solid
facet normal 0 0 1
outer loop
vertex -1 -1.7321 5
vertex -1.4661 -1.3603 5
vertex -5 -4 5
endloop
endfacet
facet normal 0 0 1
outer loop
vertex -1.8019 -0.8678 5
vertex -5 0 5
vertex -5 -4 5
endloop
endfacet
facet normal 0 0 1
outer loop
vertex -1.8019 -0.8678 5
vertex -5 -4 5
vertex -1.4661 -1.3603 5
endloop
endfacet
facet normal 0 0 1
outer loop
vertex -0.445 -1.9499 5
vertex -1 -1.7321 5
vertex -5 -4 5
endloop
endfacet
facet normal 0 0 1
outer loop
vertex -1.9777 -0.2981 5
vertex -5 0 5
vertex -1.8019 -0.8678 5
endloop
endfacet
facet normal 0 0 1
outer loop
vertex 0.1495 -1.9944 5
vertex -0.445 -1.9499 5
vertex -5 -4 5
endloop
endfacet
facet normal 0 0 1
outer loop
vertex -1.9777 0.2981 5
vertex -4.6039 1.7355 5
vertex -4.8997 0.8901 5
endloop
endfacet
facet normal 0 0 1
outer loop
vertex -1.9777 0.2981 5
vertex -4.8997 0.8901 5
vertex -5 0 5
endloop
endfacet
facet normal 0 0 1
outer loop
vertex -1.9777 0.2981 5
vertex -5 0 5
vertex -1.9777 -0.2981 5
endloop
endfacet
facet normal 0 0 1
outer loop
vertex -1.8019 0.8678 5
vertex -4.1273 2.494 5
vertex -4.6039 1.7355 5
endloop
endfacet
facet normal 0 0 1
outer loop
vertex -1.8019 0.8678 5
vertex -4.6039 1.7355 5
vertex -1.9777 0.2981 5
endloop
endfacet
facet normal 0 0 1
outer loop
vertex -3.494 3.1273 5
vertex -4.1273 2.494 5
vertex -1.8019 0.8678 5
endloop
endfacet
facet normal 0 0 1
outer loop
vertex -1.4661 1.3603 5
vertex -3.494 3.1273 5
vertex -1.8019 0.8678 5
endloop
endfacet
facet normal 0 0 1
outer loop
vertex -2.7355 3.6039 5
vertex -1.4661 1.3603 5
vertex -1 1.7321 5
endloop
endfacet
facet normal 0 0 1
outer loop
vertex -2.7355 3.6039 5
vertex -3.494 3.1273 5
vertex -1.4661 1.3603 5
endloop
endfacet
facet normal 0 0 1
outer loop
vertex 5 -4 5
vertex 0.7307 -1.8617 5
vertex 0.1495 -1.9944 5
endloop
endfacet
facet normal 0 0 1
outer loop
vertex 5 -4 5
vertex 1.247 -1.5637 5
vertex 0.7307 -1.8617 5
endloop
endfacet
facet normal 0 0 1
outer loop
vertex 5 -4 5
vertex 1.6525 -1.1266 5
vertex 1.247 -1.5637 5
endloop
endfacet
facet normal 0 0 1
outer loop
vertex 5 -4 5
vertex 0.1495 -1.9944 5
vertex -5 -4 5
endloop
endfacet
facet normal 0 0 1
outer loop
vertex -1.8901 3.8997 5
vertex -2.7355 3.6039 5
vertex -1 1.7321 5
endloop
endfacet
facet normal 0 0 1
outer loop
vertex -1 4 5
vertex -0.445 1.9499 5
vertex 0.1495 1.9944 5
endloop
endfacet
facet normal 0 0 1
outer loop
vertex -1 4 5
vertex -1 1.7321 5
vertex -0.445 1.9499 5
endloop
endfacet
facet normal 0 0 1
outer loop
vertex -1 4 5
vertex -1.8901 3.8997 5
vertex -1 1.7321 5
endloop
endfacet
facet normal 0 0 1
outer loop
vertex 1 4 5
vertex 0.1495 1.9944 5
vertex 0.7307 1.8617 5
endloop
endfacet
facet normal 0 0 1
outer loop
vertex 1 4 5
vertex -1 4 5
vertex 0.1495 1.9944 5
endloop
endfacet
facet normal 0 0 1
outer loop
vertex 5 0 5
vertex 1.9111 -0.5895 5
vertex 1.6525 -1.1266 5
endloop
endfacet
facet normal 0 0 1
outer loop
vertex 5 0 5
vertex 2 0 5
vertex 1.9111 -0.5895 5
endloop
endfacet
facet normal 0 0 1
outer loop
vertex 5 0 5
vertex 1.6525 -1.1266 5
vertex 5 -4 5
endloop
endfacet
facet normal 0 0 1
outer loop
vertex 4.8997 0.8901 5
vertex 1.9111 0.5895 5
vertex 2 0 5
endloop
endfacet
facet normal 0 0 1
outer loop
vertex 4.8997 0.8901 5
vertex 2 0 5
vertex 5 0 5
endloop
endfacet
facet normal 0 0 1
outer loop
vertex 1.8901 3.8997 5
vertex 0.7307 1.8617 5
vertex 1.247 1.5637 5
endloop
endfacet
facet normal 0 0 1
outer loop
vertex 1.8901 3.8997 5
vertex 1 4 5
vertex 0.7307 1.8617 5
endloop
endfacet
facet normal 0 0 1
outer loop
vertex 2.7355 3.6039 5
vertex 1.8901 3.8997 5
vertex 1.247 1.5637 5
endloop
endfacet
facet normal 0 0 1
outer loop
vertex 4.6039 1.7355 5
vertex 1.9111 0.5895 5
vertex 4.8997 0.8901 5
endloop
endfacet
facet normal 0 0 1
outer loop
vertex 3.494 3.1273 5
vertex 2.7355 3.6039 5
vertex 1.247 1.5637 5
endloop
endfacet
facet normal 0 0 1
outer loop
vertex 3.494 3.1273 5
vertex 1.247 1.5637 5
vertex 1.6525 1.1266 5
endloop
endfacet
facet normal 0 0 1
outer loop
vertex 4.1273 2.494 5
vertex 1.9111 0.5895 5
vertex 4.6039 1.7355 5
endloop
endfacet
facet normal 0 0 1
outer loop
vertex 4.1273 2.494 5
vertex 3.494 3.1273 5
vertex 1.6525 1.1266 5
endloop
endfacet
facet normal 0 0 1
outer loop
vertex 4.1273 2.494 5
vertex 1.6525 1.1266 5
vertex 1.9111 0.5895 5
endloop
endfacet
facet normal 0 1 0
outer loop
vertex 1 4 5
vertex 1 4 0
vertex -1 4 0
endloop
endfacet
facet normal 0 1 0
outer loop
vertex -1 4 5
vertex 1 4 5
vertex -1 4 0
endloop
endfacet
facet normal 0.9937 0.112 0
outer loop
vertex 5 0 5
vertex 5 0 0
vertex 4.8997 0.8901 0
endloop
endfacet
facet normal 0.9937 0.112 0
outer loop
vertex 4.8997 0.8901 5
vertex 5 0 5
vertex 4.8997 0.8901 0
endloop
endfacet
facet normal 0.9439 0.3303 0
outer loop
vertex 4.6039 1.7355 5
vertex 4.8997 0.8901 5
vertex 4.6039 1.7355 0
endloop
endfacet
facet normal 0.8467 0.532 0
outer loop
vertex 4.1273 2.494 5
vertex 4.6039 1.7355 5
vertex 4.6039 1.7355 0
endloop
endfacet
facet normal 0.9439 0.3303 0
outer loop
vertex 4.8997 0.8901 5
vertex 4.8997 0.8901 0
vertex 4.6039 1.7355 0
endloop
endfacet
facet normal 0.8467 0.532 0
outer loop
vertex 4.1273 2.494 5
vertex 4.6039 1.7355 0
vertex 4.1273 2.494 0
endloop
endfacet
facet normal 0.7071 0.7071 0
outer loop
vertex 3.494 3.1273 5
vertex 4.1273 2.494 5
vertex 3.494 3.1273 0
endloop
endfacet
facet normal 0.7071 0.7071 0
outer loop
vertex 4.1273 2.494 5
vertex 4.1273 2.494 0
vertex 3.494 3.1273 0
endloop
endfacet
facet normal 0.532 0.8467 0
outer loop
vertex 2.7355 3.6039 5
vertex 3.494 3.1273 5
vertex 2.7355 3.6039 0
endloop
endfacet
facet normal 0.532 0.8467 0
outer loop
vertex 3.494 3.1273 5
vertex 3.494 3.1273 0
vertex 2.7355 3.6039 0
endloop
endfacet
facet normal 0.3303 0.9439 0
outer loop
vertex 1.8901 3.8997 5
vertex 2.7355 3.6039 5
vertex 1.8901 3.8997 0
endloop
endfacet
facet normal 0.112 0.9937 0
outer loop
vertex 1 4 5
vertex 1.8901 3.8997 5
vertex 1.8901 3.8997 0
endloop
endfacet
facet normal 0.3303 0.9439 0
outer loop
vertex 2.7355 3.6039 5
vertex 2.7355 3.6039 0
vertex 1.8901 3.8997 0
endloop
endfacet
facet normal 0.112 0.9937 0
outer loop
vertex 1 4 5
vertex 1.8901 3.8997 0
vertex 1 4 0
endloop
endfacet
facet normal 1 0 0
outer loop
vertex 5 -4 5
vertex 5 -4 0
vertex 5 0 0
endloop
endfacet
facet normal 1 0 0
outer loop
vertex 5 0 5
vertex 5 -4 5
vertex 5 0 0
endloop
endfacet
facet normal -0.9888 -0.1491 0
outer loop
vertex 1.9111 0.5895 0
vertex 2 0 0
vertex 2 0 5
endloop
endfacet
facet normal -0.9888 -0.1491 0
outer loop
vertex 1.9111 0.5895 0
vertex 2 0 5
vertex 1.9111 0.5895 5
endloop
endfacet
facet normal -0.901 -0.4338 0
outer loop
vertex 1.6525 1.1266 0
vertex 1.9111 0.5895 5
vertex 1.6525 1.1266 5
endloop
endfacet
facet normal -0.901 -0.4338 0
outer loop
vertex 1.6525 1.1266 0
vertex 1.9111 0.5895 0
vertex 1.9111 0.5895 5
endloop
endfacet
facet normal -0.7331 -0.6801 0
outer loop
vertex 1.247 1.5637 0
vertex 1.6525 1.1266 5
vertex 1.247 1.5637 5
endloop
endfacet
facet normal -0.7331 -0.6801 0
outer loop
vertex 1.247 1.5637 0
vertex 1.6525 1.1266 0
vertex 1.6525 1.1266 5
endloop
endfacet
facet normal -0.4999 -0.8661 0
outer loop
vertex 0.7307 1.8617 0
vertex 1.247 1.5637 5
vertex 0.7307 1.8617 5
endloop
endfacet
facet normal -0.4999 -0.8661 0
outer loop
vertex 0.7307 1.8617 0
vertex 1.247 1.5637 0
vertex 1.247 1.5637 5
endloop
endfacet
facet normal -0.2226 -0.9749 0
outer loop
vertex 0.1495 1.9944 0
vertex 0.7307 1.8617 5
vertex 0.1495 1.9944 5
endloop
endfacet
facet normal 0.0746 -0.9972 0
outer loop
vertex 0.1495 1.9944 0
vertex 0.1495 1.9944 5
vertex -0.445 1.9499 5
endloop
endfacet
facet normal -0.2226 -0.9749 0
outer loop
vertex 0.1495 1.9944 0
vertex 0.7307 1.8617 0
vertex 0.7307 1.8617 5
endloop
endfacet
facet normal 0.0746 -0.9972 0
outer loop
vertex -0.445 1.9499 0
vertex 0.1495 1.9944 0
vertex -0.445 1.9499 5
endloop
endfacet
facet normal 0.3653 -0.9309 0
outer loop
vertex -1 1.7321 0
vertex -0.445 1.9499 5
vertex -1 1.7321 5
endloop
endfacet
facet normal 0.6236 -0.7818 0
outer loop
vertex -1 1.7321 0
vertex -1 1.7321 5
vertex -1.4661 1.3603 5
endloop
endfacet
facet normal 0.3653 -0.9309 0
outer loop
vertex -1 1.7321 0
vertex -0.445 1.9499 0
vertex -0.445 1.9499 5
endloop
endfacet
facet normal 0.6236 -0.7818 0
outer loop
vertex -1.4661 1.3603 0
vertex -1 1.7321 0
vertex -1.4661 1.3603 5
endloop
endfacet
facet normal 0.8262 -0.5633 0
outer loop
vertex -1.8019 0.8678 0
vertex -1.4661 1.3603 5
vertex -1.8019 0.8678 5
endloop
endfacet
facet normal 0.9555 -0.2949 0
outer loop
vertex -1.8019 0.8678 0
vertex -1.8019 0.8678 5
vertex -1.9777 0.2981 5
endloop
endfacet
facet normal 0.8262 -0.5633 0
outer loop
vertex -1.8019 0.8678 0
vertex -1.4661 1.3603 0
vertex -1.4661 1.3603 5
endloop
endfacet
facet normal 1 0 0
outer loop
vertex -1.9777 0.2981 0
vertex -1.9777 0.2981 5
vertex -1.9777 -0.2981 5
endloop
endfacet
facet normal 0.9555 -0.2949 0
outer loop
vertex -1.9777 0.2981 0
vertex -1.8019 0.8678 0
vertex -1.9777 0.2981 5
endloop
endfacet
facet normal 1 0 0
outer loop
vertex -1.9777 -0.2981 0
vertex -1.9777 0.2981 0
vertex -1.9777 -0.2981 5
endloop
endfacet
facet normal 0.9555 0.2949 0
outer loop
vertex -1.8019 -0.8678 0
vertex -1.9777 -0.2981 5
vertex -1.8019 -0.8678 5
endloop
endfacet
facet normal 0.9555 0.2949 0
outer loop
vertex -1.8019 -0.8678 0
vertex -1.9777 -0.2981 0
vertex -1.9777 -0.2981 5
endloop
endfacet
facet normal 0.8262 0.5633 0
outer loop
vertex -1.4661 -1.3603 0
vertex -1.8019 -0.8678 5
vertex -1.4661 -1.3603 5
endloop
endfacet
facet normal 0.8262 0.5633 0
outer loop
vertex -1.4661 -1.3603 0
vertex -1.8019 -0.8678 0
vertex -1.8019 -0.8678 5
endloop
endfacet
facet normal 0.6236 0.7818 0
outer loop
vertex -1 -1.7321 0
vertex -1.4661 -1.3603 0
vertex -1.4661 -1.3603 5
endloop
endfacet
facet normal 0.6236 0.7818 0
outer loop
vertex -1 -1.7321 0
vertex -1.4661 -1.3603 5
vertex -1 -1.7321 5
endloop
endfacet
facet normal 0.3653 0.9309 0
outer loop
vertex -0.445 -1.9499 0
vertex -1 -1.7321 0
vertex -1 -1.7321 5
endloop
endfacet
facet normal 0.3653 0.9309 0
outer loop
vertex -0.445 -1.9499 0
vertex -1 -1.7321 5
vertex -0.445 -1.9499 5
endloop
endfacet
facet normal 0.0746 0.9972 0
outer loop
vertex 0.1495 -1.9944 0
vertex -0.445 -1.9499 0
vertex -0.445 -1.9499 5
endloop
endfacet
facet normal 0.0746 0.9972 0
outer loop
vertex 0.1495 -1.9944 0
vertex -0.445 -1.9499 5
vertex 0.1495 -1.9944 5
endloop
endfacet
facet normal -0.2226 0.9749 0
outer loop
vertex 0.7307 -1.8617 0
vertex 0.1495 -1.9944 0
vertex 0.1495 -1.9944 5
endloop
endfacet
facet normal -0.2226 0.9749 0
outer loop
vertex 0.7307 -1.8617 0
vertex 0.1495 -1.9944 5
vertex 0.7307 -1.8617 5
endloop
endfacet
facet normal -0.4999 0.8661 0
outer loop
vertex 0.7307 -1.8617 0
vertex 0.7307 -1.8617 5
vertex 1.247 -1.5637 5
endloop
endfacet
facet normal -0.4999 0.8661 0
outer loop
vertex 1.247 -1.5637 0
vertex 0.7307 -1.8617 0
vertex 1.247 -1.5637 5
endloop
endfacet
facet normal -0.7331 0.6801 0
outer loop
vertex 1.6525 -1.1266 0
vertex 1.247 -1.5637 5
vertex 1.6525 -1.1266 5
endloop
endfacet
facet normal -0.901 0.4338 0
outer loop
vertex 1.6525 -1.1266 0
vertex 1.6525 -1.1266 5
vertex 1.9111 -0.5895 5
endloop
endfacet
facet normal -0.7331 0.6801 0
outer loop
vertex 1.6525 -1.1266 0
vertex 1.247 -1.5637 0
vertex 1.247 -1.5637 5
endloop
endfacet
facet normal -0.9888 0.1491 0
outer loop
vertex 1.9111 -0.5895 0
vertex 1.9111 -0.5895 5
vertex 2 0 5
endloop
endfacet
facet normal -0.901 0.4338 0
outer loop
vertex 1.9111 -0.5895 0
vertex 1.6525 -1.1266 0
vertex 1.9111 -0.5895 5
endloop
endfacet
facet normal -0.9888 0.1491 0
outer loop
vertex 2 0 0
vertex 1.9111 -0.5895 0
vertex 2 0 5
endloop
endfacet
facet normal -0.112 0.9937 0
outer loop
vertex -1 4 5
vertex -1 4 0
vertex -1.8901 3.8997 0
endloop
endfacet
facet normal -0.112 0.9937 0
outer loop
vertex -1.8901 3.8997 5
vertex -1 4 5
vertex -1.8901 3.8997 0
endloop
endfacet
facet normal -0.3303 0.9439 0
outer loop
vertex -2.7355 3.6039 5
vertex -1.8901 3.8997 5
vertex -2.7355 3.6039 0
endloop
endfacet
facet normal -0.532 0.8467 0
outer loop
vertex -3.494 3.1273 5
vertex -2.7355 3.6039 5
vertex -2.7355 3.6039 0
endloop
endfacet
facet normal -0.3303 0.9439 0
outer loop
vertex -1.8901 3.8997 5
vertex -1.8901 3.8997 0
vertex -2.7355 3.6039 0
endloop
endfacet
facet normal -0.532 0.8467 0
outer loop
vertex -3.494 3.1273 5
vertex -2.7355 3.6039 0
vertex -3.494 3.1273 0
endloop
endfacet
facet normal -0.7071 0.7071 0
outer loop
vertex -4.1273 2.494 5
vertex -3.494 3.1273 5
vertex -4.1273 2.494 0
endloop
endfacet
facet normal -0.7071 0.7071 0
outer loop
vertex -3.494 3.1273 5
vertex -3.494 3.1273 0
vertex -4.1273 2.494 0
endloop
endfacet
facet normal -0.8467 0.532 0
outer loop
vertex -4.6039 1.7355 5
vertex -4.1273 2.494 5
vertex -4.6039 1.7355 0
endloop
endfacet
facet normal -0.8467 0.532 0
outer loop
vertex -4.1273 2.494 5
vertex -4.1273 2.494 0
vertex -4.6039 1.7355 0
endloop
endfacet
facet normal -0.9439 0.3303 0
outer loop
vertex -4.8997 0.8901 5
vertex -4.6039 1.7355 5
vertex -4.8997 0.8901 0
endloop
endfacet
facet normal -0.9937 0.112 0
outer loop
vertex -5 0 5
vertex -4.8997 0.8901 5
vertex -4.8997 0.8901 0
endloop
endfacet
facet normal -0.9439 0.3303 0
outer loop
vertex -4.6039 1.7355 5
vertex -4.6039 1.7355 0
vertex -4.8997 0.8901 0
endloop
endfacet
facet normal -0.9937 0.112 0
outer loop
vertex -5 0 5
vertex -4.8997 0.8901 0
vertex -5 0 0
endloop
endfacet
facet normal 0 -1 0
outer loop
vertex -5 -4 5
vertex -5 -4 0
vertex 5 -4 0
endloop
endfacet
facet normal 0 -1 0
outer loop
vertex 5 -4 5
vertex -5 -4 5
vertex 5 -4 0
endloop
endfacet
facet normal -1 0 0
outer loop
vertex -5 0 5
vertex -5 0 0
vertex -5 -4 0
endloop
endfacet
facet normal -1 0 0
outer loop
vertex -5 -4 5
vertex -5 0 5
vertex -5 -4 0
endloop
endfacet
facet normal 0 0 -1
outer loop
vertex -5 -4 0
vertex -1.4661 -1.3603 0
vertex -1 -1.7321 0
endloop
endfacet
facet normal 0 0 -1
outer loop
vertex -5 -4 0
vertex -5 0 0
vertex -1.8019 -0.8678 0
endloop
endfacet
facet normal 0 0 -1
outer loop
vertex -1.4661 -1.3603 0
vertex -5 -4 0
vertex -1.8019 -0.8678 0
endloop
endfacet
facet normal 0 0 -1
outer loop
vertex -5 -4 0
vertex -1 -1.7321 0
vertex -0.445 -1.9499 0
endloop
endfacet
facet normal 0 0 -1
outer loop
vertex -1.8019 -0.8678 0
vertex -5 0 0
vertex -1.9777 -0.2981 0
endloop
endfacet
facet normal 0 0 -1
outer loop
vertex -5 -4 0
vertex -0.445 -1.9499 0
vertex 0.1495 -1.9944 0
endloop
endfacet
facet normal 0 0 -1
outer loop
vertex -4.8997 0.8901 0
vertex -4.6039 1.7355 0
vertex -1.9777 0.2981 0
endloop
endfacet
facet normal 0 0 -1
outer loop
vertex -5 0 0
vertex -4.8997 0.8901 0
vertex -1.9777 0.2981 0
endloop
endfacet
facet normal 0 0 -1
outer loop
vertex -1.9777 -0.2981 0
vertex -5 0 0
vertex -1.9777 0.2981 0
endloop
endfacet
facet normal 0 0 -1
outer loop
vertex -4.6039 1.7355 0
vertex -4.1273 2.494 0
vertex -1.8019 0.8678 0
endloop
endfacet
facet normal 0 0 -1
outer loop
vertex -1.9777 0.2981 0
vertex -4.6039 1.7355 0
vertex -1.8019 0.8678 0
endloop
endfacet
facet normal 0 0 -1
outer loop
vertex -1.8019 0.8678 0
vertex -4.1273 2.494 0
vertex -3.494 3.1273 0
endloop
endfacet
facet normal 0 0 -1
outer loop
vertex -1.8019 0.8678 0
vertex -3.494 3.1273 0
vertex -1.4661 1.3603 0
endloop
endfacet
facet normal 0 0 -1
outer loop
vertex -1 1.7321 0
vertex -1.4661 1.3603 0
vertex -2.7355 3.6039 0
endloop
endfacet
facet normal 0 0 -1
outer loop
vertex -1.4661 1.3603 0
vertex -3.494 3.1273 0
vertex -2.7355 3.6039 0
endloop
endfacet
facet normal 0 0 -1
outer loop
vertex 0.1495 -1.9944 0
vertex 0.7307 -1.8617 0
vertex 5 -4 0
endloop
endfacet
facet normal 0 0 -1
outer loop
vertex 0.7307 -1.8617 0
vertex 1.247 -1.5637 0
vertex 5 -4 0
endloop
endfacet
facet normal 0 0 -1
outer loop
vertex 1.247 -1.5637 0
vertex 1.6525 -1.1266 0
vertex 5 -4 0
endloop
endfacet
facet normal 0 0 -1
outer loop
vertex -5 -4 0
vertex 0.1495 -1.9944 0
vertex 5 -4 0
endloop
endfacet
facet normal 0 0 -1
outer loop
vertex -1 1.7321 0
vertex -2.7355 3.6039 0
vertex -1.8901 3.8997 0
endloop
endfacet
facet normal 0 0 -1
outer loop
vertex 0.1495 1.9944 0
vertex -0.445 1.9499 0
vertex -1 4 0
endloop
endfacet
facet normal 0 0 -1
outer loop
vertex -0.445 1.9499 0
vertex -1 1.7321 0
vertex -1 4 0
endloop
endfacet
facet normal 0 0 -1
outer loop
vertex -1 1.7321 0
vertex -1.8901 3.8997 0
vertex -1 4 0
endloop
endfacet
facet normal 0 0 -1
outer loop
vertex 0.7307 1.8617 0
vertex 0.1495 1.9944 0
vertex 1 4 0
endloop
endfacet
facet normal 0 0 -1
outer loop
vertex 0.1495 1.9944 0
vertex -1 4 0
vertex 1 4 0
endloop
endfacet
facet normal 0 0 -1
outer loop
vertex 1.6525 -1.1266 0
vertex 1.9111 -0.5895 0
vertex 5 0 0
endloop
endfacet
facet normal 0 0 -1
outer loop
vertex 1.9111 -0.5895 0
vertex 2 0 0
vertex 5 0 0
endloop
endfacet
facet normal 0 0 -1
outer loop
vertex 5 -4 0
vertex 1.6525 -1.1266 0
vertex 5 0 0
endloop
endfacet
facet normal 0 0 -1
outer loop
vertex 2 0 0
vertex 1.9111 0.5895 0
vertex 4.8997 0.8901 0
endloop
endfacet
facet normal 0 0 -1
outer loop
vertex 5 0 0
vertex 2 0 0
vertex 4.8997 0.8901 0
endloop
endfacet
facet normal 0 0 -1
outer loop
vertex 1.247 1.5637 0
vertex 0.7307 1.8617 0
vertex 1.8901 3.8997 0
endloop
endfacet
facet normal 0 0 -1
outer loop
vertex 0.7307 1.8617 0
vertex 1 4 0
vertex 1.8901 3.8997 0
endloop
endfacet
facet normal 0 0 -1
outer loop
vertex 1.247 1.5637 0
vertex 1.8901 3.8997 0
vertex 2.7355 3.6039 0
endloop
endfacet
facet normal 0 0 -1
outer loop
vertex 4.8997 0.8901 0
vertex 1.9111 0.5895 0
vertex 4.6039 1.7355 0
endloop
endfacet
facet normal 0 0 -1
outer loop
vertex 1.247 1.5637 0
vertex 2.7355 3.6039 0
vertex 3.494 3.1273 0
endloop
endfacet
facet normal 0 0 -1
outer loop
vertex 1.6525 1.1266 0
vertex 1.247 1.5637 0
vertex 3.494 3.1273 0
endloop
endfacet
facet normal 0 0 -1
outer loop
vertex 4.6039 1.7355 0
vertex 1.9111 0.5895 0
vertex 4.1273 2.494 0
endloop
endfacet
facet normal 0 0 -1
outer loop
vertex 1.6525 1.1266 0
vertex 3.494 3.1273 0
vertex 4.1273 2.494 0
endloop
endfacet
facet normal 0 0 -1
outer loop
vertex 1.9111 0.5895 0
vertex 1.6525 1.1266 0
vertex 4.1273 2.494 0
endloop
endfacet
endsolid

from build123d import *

# Parameters (mm, degrees)
F0_R     = 2
F1_DEPTH = 5


with BuildPart() as f1:
    # F0 (on Top) → F1 (new body)
    with BuildSketch(Plane.XY):
        with BuildLine():
            Line((-5, -4), (5, -4))
            Line((5, -4), (5, 0))
            ThreePointArc((5, 0), (3.828427, 2.828427), (1, 4))
            Line((1, 4), (-1, 4))
            ThreePointArc((-1, 4), (-3.828427, 2.828427), (-5, 0))
            Line((-5, 0), (-5, -4))
        make_face()
        Circle(F0_R, mode=Mode.SUBTRACT)
    extrude(amount=F1_DEPTH)


solid = f1.part
